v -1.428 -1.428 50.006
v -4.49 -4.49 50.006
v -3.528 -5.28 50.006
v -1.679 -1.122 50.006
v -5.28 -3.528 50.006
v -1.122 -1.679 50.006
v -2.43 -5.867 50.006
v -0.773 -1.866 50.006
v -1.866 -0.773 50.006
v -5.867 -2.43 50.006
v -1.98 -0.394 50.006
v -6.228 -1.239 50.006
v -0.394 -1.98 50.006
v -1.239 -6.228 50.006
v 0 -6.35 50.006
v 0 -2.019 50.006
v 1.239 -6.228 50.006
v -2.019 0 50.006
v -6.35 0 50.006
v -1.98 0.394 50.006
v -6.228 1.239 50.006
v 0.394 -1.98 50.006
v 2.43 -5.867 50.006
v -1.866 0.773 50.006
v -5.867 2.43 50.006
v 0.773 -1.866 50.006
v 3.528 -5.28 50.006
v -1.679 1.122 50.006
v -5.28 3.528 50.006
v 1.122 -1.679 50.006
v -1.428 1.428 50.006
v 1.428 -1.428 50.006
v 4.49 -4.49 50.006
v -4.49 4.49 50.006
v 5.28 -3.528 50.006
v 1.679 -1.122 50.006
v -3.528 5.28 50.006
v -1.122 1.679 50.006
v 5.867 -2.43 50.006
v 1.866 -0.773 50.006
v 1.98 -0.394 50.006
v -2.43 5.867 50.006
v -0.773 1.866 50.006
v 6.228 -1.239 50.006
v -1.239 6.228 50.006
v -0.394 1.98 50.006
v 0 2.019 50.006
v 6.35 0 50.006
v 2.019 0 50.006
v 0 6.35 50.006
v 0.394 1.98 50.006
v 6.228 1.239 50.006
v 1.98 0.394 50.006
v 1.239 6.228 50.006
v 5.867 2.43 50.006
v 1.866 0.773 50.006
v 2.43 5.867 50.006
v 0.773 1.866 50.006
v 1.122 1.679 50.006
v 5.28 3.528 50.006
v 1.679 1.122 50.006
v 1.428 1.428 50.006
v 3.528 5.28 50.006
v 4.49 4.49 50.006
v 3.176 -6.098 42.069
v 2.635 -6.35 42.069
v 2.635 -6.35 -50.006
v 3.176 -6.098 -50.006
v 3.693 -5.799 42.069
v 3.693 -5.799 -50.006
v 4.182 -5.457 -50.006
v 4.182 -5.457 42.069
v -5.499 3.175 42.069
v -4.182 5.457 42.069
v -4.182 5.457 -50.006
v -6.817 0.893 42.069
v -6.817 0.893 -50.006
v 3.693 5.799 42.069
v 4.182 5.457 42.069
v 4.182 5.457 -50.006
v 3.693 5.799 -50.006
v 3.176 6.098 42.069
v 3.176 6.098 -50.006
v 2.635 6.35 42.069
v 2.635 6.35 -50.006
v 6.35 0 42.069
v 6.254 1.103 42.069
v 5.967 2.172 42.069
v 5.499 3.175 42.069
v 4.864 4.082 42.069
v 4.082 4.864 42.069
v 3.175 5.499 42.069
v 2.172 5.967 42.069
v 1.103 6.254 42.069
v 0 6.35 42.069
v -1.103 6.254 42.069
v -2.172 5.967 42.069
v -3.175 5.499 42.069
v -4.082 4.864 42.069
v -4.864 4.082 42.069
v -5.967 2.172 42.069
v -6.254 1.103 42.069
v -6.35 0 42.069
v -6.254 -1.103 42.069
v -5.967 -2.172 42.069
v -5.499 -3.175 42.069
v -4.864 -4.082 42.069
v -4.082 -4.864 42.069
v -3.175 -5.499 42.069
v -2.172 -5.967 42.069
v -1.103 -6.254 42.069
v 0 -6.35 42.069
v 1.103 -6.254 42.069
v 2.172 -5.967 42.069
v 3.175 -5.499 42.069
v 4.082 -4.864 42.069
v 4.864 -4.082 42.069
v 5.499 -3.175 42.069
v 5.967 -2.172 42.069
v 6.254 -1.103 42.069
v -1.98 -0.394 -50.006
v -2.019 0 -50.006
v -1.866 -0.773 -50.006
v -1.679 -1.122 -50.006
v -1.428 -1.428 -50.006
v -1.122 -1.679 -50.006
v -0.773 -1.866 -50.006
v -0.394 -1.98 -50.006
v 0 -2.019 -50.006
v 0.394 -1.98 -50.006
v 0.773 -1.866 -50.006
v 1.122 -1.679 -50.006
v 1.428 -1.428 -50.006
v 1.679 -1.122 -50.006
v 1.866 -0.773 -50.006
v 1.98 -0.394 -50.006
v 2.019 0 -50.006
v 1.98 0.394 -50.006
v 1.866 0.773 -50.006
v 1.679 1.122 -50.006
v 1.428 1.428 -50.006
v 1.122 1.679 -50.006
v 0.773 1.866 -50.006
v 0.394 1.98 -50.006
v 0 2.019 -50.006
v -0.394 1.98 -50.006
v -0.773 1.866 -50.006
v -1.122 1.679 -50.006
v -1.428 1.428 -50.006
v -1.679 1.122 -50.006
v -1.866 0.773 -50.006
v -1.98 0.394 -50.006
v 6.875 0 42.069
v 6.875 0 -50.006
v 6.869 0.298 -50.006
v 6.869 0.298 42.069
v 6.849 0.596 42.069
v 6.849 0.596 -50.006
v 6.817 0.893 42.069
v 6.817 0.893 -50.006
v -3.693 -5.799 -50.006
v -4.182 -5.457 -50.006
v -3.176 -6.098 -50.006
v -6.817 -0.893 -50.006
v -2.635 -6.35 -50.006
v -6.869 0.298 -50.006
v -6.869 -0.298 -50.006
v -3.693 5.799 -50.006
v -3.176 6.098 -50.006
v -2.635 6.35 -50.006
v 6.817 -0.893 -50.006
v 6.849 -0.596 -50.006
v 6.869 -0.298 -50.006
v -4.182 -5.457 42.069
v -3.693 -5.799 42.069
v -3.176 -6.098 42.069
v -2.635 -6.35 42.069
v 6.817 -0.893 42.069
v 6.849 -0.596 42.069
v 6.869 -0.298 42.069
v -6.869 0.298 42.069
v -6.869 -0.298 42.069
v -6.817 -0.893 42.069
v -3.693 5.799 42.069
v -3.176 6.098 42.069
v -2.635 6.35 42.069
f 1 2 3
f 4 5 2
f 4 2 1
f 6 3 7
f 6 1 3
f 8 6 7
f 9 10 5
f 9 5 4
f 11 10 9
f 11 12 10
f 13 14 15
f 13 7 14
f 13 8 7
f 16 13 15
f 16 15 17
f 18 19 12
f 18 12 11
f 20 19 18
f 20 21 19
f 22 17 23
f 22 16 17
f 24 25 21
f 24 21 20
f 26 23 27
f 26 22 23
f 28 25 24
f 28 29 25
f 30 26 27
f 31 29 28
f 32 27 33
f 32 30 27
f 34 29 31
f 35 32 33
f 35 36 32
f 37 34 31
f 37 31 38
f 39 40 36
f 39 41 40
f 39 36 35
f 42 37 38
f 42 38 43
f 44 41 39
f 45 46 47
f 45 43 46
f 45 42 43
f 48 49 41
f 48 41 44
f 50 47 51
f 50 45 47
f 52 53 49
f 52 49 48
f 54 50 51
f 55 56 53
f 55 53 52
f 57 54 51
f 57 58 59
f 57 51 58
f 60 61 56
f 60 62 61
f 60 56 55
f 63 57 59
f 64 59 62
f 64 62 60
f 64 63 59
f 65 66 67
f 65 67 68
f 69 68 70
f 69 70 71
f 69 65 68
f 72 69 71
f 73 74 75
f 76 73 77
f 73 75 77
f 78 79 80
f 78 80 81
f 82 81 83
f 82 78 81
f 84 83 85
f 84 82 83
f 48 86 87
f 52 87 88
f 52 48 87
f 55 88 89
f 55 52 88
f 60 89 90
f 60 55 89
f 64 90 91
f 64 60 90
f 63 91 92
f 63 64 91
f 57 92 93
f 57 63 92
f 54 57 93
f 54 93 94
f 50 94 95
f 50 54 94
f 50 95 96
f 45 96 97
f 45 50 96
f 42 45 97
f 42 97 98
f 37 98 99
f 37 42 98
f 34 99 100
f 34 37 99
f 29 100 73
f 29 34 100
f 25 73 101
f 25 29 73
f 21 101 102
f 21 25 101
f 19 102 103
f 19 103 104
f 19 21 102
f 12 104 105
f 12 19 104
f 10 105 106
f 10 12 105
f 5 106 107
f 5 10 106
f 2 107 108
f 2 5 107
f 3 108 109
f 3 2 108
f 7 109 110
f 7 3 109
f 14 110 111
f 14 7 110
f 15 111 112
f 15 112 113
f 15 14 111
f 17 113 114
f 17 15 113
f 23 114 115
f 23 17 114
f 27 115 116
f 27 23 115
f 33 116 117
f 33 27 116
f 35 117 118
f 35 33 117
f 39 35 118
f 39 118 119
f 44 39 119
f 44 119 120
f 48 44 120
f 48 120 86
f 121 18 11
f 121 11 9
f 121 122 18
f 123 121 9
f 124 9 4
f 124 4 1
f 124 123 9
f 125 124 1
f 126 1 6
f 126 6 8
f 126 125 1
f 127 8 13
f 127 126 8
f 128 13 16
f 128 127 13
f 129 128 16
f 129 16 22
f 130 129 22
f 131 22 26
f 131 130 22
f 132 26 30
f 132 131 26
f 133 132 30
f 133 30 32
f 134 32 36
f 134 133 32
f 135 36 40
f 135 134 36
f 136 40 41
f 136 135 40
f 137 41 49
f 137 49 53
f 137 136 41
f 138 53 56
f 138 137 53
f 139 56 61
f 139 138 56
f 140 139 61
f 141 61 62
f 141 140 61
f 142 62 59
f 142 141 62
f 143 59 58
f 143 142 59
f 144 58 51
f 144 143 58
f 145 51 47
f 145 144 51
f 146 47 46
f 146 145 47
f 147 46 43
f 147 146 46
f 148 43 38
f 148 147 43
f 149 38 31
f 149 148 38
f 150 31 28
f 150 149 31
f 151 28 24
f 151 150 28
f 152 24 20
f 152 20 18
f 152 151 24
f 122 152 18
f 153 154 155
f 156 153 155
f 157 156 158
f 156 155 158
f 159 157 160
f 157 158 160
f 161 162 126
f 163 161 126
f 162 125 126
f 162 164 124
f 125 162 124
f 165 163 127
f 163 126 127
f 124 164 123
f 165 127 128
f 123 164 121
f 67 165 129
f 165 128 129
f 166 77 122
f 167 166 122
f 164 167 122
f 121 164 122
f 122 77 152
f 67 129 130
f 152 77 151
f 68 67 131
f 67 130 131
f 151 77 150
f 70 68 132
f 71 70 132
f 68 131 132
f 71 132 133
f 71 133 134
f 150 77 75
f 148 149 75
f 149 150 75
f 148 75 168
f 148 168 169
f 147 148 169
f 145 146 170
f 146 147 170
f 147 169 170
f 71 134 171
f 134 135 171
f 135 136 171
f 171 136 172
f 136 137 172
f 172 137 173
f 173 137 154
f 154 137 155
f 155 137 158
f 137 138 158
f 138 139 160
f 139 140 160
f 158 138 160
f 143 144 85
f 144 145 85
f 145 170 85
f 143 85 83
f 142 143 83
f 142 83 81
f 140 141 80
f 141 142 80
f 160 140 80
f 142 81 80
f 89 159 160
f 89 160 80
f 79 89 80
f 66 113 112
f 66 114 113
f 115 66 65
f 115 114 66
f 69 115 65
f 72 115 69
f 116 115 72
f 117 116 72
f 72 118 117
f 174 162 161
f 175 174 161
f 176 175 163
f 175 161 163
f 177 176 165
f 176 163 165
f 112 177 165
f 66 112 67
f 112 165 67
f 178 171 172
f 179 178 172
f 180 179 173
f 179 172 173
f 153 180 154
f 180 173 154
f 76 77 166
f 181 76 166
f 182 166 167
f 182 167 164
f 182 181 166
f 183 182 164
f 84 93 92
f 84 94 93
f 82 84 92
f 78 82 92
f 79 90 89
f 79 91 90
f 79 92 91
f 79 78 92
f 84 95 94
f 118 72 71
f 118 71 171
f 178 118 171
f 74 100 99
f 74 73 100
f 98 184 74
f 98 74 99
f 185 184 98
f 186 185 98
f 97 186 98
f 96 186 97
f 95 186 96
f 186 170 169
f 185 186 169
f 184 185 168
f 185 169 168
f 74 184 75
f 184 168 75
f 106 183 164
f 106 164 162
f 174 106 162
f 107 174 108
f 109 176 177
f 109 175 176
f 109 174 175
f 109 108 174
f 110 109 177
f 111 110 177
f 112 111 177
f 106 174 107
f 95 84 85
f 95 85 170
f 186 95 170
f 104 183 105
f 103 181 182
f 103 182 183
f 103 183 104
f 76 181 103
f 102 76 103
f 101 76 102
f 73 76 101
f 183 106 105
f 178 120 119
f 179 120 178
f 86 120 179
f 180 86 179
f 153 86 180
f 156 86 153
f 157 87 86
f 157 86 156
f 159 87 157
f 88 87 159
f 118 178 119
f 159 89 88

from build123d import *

# Parameters (mm, degrees)
SKETCH1_R           = 2.0193
BOSS_EXTRUDE1_DEPTH = 50.00625
SKETCH2_OUTSIDE_W   = 36.1
SKETCH2_OUTSIDE_H   = 35.05
SKETCH2_OUTSIDE_R   = 6.35
CUT_EXTRUDE2_DEPTH  = 7.9375


with BuildPart() as part:
    # Sketch1 → Boss-Extrude1 (new, symmetric)
    with BuildSketch(Plane.XY):
        with BuildLine():
            ThreePointArc((4.181770846, 5.456960429), (3.437499983, 5.953924622), (2.634980936, 6.35))
            Line((2.634980936, 6.35), (-2.634980936, 6.35))
            ThreePointArc((-2.634980936, 6.35), (-3.437499983, 5.953924622), (-4.181770846, 5.456960429))
            Line((-4.181770846, 5.456960429), (-6.816751782, 0.893039571))
            ThreePointArc((-6.816751782, 0.893039571), (-6.874999966, 0), (-6.816751782, -0.893039571))
            Line((-6.816751782, -0.893039571), (-4.181770846, -5.456960429))
            ThreePointArc((-4.181770846, -5.456960429), (-3.437499983, -5.953924622), (-2.634980936, -6.35))
            Line((-2.634980936, -6.35), (2.634980936, -6.35))
            ThreePointArc((2.634980936, -6.35), (3.437499983, -5.953924622), (4.181770846, -5.456960429))
            Line((4.181770846, -5.456960429), (6.816751782, -0.893039571))
            ThreePointArc((6.816751782, -0.893039571), (6.860422465, -0.447468582), (6.874999966, 0))
            ThreePointArc((6.874999966, 0), (6.860422465, 0.447468582), (6.816751782, 0.893039571))
            Line((6.816751782, 0.893039571), (4.181770846, 5.456960429))
        make_face()
        with Locations(Location((0, 0, 0), (0, 0, 180))):
            Circle(SKETCH1_R, mode=Mode.SUBTRACT)
    extrude(amount=BOSS_EXTRUDE1_DEPTH, both=True)

    # Sketch2 outside → Cut-Extrude2 (cut)
    with BuildSketch(Plane.XY.offset(50.00625)):
        Rectangle(SKETCH2_OUTSIDE_W, SKETCH2_OUTSIDE_H)
        Circle(SKETCH2_OUTSIDE_R, mode=Mode.SUBTRACT)
    extrude(amount=-CUT_EXTRUDE2_DEPTH, mode=Mode.SUBTRACT)


solid = part.part
